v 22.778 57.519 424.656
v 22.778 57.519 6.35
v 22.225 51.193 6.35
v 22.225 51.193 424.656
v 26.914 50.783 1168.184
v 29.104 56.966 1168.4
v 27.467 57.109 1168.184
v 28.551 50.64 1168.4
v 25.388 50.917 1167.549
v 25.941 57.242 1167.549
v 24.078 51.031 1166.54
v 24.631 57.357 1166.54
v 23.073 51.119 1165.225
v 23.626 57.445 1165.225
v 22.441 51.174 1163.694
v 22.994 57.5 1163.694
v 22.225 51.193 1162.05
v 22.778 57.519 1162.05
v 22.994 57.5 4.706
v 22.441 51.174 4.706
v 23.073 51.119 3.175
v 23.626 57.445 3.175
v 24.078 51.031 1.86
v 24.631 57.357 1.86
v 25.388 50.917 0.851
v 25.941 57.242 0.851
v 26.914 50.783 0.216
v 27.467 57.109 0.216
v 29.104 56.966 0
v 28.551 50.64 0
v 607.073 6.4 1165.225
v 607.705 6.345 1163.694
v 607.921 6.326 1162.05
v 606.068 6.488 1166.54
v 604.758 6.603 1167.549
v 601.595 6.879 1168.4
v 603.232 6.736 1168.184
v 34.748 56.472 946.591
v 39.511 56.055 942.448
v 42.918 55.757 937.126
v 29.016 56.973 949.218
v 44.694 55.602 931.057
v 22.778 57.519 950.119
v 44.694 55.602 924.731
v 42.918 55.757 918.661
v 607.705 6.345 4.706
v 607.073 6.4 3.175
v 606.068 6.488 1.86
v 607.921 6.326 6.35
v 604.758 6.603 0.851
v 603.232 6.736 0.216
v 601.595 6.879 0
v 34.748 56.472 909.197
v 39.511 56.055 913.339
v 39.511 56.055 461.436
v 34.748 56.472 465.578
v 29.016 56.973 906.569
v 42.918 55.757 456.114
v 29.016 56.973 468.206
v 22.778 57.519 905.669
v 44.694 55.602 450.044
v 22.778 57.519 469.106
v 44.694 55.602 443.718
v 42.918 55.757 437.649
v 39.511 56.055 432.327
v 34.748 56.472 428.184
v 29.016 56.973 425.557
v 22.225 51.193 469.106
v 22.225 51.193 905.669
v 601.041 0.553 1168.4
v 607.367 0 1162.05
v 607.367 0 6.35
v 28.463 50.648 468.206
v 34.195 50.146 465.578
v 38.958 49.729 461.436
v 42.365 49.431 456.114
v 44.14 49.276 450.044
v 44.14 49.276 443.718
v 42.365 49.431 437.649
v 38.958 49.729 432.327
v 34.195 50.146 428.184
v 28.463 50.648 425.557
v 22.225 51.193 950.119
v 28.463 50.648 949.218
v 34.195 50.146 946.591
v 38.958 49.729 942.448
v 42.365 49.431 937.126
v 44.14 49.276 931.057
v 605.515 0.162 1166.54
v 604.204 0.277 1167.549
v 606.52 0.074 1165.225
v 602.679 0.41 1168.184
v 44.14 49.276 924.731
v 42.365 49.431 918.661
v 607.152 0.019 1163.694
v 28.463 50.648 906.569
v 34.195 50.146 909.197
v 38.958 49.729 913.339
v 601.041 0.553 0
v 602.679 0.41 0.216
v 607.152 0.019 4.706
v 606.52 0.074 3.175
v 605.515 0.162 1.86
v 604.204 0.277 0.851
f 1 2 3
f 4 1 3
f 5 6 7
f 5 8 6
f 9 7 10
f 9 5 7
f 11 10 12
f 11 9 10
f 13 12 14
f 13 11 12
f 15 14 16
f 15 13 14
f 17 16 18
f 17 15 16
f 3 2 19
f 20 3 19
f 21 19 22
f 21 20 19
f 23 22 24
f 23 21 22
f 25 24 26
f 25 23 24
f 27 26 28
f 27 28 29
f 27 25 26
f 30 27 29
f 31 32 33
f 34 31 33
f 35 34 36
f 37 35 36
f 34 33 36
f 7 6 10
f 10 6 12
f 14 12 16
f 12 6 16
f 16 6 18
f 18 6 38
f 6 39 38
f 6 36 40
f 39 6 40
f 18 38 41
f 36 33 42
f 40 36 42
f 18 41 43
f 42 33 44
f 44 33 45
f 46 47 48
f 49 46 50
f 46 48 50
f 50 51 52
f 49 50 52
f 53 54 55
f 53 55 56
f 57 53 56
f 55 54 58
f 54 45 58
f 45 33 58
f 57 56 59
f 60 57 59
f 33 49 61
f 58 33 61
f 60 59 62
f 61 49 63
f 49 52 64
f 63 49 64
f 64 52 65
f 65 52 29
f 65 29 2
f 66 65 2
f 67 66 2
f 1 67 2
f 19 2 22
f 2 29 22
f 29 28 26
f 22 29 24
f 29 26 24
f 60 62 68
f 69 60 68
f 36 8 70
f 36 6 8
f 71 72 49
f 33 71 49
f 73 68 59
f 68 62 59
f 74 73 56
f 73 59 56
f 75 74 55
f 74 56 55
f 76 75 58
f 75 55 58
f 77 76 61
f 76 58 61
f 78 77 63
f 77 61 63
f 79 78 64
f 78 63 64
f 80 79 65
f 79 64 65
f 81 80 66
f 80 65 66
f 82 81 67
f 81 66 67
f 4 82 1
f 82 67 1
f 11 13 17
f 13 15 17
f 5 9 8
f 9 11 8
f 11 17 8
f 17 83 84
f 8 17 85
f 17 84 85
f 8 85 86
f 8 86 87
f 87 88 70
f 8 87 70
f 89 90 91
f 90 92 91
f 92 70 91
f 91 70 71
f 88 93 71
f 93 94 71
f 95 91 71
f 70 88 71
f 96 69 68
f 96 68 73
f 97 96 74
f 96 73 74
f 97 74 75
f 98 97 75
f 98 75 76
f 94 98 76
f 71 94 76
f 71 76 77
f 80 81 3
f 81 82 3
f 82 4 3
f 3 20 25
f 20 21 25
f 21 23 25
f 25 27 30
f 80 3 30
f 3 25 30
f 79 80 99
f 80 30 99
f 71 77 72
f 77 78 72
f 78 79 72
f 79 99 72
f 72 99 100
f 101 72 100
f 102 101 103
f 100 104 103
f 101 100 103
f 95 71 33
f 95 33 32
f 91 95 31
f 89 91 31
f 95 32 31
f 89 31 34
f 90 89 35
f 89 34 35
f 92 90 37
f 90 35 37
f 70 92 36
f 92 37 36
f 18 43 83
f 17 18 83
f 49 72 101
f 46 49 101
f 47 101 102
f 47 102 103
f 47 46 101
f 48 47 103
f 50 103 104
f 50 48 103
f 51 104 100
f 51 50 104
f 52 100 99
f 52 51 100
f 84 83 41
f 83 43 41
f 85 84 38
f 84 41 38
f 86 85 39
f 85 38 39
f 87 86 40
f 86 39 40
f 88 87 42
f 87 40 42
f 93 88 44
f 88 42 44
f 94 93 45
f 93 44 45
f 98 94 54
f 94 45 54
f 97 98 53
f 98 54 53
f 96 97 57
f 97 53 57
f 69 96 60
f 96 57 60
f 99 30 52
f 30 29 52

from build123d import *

# Parameters (mm, degrees)
BOSS_EXTRUDE1_DEPTH = 1168.4
SKETCH4_R           = 22.225
CUT_EXTRUDE1_DEPTH  = 58.348513463
FILLET1_R           = 6.35


with BuildPart() as part:
    # Sketch1 → Boss-Extrude1 (new body)
    with BuildSketch(Plane.XY):
        Polygon((22.225, 51.193319499), (607.367319431, 0), (607.920758397, 6.325836333), (22.778438966, 57.519155832), align=None)
    extrude(amount=BOSS_EXTRUDE1_DEPTH)

    # Sketch4 → Cut-Extrude1 (cut, through all)
    with BuildSketch(Plane(origin=(5.167076131, 59.05995043, 0), x_dir=(0.996194698, -0.087155743, 0), z_dir=(0.087155743, 0.996194698, 0))):
        with Locations((17.67863538, -446.88125)):
            Circle(SKETCH4_R)
        with Locations((17.67863538, -927.89375)):
            Circle(SKETCH4_R)
    extrude(amount=-CUT_EXTRUDE1_DEPTH, mode=Mode.SUBTRACT)

    # Fillet1
    fillet1_edges = [part.edges().sort_by_distance(p)[0] for p in [
        (607.644038914, 3.162918166, 1168.4),
        (22.501719483, 54.356237666, 1168.4),
        (607.644038914, 3.162918166, 0),
        (22.501719483, 54.356237666, 0),
    ]]
    fillet(fillet1_edges, radius=FILLET1_R)


solid = part.part
